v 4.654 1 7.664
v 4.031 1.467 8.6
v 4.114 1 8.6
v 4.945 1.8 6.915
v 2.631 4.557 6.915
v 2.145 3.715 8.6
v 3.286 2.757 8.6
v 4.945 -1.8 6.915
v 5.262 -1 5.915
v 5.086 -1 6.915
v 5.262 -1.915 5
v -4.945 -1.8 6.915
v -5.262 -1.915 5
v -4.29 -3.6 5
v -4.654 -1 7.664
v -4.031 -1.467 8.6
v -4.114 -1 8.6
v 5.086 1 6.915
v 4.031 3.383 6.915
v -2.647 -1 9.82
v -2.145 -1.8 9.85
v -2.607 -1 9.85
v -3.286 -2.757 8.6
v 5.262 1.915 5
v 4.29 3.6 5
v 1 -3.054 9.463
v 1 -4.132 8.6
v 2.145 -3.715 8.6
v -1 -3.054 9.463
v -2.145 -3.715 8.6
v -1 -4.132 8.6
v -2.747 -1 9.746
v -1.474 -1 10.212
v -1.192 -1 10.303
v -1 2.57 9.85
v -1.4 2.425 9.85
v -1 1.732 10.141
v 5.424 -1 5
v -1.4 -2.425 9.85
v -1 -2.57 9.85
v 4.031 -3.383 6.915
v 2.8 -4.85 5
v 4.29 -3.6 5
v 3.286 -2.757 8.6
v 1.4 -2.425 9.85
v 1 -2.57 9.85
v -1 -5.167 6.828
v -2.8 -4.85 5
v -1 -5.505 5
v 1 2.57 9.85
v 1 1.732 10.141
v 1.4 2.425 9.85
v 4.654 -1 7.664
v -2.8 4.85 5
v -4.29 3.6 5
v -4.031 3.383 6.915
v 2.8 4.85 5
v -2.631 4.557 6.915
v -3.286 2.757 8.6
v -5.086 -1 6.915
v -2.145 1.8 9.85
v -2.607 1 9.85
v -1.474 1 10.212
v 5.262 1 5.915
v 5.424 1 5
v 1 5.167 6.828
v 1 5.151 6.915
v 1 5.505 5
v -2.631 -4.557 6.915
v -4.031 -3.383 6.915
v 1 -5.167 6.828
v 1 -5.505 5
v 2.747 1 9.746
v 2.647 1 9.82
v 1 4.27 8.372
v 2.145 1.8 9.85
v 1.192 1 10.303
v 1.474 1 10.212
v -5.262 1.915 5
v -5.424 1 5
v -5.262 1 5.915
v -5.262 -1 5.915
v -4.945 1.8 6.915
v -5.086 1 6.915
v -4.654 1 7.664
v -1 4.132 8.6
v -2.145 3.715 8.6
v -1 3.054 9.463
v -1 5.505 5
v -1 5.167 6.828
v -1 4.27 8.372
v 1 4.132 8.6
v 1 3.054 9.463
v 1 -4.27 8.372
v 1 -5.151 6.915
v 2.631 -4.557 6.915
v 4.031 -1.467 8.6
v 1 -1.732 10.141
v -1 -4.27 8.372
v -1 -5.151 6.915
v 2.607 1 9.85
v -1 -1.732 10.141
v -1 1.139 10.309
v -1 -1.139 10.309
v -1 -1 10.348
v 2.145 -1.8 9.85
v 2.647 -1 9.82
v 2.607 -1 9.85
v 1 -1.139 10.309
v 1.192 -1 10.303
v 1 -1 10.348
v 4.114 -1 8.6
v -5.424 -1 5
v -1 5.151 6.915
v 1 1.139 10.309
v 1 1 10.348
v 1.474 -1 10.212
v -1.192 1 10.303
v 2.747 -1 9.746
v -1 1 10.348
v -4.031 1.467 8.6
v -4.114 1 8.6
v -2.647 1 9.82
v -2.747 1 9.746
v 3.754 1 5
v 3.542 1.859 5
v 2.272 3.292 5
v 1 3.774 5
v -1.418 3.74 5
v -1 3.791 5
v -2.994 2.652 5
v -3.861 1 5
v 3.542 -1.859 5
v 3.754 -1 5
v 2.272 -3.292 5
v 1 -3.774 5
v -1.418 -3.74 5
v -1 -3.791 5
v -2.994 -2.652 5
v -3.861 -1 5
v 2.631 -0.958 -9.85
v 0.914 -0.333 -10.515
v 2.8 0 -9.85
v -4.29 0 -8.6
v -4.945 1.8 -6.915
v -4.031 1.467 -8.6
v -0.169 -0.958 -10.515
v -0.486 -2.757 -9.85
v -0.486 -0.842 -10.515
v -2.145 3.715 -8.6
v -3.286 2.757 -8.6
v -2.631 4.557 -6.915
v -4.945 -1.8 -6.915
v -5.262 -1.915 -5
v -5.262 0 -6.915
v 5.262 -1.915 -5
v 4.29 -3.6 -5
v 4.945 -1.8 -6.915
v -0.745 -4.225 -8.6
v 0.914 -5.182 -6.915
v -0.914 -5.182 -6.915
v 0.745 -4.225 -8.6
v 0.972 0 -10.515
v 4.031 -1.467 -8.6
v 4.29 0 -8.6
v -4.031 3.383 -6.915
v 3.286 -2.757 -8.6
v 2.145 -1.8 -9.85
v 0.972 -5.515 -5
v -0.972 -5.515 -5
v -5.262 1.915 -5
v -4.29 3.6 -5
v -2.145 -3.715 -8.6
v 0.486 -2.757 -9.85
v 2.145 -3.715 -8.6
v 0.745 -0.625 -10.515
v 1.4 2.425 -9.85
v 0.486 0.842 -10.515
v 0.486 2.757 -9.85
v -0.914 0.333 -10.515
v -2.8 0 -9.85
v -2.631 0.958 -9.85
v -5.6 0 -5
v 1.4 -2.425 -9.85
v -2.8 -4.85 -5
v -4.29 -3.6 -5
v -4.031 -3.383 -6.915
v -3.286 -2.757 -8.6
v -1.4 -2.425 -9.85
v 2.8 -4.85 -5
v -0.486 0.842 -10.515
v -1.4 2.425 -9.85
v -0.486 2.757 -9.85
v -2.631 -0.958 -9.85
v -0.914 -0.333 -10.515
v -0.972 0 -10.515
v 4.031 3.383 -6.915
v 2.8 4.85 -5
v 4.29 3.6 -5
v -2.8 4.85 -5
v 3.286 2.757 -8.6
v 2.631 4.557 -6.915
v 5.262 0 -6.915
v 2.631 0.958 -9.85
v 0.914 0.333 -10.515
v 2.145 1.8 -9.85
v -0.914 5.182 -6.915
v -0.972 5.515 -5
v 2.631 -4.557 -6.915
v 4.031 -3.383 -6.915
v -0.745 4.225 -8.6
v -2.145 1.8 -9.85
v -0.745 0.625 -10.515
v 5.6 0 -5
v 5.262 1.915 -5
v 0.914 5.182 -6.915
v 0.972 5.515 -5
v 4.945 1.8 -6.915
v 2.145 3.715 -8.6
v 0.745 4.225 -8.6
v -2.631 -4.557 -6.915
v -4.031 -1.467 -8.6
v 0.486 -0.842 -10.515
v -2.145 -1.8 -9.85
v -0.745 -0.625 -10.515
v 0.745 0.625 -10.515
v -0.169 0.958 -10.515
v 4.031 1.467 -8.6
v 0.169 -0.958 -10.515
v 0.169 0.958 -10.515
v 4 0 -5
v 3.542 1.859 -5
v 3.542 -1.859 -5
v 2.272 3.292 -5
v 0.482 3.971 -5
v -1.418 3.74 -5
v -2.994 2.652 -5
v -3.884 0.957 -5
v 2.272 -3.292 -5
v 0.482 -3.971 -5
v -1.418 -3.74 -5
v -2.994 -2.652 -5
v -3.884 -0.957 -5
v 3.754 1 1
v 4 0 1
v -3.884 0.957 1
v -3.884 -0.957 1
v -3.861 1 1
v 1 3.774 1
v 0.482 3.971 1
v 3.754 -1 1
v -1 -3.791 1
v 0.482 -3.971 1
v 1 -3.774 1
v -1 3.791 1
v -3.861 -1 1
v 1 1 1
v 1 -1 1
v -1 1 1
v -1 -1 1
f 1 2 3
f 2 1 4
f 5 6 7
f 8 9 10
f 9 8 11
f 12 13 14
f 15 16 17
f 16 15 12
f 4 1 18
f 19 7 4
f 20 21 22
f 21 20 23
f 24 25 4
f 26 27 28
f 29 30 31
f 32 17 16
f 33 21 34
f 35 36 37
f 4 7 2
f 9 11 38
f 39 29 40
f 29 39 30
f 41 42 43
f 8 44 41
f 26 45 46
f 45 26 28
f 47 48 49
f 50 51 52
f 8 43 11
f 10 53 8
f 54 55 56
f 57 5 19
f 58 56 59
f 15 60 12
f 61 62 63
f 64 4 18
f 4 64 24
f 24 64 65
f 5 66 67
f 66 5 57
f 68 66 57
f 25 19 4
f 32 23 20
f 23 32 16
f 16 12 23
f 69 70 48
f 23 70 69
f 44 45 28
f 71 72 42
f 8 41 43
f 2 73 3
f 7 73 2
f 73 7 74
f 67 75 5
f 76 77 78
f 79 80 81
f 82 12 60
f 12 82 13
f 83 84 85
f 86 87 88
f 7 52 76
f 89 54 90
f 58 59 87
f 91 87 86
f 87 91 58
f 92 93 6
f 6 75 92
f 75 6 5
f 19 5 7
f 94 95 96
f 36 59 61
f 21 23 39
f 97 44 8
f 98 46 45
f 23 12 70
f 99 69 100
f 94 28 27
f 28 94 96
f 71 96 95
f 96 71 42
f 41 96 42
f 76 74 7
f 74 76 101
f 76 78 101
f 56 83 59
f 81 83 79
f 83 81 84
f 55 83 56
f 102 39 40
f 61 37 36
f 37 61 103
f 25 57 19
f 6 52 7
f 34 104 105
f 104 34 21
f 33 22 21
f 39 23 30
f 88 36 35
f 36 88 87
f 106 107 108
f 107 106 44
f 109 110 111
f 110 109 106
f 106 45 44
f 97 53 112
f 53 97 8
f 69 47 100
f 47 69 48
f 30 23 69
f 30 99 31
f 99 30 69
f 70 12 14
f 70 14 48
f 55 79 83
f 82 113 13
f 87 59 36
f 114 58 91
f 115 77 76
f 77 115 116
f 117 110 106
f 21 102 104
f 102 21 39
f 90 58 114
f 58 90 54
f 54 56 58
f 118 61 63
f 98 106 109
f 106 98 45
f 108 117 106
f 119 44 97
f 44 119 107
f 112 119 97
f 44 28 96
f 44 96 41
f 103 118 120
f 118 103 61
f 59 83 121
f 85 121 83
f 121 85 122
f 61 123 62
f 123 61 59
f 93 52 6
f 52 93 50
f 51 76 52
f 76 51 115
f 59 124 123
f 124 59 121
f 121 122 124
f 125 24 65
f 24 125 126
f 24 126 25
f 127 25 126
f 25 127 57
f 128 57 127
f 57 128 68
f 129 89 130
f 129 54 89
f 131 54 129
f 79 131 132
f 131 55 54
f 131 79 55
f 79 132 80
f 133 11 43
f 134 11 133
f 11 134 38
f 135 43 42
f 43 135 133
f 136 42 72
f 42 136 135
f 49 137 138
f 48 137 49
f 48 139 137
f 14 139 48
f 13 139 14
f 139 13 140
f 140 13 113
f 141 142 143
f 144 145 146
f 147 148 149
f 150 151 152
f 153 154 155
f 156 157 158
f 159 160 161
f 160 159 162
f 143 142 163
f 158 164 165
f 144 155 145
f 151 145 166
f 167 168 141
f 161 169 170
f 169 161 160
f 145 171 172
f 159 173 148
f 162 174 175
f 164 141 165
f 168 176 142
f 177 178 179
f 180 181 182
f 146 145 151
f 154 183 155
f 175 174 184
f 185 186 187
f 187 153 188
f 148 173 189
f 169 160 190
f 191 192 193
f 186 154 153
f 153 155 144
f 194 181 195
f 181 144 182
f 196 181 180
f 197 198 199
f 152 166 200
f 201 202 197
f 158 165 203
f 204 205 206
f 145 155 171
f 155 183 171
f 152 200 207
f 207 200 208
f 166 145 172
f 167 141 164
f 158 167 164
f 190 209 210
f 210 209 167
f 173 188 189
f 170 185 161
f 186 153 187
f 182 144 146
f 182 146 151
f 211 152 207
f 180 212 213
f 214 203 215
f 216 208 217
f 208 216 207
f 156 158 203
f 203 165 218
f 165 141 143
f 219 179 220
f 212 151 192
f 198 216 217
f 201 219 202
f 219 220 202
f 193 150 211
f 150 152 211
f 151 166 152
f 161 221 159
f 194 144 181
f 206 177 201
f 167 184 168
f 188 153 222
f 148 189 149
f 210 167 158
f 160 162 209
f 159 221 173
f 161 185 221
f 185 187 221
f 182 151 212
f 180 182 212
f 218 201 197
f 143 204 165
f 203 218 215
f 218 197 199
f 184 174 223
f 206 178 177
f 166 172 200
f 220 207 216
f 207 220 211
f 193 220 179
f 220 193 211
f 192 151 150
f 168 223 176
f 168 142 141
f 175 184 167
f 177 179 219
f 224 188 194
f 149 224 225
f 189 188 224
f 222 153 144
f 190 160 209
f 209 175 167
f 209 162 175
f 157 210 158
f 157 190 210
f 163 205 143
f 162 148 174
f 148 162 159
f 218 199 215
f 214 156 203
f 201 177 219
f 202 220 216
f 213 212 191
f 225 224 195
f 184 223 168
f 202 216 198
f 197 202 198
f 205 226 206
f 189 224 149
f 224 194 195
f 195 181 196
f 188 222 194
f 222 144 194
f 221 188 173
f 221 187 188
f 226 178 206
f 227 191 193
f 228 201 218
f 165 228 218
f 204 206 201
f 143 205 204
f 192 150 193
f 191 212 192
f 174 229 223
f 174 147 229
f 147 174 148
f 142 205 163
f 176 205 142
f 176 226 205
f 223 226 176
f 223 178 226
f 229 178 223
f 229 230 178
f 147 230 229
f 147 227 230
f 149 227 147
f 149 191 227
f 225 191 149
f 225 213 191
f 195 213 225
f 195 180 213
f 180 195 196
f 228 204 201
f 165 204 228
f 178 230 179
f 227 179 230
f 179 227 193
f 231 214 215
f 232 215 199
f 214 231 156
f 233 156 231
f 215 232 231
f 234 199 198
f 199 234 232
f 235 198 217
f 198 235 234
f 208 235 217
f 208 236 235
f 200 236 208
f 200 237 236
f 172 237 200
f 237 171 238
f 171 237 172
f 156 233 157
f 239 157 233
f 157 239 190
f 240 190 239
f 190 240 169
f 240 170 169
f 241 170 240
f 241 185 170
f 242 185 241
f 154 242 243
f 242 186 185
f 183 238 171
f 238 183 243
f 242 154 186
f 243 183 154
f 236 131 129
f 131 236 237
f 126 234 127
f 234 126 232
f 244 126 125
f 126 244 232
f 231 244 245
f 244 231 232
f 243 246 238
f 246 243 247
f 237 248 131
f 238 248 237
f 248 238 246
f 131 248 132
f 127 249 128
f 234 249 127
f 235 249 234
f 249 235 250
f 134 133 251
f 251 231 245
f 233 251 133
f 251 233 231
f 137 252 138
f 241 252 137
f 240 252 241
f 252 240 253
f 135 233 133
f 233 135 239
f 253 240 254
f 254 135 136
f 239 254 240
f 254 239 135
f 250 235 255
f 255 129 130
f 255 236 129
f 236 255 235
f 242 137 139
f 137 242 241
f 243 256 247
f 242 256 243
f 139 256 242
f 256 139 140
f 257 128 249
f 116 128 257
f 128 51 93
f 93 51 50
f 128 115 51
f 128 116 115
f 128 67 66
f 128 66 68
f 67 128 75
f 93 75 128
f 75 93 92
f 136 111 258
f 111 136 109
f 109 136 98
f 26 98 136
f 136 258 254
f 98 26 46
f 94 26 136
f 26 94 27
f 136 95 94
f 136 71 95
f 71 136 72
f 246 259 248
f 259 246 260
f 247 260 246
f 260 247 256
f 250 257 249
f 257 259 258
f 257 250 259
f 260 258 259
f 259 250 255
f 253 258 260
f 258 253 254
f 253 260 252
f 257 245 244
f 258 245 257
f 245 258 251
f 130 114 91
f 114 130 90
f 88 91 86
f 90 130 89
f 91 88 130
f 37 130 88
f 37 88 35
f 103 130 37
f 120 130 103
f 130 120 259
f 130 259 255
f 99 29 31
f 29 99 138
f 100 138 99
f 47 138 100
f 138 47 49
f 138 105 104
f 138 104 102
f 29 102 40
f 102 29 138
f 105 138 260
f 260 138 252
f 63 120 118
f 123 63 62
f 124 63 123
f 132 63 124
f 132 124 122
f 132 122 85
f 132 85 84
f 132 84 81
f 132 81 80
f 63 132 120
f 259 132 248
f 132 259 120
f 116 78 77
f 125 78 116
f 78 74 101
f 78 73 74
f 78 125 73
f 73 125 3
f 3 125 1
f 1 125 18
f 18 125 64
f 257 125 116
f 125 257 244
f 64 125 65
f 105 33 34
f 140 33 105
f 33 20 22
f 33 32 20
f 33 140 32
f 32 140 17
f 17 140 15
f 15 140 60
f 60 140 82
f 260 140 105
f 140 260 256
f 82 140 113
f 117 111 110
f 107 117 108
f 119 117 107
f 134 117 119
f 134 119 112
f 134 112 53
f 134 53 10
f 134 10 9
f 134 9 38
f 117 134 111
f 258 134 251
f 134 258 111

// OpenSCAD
module topper(topper_radius, factor)
{
    difference() 
    {
        sphere(factor*topper_radius);
        translate(v = [0, 0, -2*topper_radius]) cube(4*topper_radius, center=true);
    }
}

module basepin(pin_height, pin_radius, factor)
{
    union() 
    {
        cylinder(h = pin_height, r = pin_radius, center=true);
        translate(v = [0, 0, pin_height/2]) topper(pin_radius, factor);
        rotate(a = 180, v = [0, 1, 0]) translate(v = [0, 0, pin_height/2]) topper(pin_radius, factor);
    }
}

module pin(pin_height, pin_radius, factor)
{
    difference() {
        basepin(pin_height, pin_radius, factor);
        translate(v = [0, 0, pin_radius*2]) cube([pin_radius/2, pin_radius*4, pin_height*factor], center=true);
        translate(v = [0, 0, pin_radius*2]) cube([pin_radius*4, pin_radius/2, pin_height*factor], center=true);
    }

}

pin(10, 4, 1.4);
